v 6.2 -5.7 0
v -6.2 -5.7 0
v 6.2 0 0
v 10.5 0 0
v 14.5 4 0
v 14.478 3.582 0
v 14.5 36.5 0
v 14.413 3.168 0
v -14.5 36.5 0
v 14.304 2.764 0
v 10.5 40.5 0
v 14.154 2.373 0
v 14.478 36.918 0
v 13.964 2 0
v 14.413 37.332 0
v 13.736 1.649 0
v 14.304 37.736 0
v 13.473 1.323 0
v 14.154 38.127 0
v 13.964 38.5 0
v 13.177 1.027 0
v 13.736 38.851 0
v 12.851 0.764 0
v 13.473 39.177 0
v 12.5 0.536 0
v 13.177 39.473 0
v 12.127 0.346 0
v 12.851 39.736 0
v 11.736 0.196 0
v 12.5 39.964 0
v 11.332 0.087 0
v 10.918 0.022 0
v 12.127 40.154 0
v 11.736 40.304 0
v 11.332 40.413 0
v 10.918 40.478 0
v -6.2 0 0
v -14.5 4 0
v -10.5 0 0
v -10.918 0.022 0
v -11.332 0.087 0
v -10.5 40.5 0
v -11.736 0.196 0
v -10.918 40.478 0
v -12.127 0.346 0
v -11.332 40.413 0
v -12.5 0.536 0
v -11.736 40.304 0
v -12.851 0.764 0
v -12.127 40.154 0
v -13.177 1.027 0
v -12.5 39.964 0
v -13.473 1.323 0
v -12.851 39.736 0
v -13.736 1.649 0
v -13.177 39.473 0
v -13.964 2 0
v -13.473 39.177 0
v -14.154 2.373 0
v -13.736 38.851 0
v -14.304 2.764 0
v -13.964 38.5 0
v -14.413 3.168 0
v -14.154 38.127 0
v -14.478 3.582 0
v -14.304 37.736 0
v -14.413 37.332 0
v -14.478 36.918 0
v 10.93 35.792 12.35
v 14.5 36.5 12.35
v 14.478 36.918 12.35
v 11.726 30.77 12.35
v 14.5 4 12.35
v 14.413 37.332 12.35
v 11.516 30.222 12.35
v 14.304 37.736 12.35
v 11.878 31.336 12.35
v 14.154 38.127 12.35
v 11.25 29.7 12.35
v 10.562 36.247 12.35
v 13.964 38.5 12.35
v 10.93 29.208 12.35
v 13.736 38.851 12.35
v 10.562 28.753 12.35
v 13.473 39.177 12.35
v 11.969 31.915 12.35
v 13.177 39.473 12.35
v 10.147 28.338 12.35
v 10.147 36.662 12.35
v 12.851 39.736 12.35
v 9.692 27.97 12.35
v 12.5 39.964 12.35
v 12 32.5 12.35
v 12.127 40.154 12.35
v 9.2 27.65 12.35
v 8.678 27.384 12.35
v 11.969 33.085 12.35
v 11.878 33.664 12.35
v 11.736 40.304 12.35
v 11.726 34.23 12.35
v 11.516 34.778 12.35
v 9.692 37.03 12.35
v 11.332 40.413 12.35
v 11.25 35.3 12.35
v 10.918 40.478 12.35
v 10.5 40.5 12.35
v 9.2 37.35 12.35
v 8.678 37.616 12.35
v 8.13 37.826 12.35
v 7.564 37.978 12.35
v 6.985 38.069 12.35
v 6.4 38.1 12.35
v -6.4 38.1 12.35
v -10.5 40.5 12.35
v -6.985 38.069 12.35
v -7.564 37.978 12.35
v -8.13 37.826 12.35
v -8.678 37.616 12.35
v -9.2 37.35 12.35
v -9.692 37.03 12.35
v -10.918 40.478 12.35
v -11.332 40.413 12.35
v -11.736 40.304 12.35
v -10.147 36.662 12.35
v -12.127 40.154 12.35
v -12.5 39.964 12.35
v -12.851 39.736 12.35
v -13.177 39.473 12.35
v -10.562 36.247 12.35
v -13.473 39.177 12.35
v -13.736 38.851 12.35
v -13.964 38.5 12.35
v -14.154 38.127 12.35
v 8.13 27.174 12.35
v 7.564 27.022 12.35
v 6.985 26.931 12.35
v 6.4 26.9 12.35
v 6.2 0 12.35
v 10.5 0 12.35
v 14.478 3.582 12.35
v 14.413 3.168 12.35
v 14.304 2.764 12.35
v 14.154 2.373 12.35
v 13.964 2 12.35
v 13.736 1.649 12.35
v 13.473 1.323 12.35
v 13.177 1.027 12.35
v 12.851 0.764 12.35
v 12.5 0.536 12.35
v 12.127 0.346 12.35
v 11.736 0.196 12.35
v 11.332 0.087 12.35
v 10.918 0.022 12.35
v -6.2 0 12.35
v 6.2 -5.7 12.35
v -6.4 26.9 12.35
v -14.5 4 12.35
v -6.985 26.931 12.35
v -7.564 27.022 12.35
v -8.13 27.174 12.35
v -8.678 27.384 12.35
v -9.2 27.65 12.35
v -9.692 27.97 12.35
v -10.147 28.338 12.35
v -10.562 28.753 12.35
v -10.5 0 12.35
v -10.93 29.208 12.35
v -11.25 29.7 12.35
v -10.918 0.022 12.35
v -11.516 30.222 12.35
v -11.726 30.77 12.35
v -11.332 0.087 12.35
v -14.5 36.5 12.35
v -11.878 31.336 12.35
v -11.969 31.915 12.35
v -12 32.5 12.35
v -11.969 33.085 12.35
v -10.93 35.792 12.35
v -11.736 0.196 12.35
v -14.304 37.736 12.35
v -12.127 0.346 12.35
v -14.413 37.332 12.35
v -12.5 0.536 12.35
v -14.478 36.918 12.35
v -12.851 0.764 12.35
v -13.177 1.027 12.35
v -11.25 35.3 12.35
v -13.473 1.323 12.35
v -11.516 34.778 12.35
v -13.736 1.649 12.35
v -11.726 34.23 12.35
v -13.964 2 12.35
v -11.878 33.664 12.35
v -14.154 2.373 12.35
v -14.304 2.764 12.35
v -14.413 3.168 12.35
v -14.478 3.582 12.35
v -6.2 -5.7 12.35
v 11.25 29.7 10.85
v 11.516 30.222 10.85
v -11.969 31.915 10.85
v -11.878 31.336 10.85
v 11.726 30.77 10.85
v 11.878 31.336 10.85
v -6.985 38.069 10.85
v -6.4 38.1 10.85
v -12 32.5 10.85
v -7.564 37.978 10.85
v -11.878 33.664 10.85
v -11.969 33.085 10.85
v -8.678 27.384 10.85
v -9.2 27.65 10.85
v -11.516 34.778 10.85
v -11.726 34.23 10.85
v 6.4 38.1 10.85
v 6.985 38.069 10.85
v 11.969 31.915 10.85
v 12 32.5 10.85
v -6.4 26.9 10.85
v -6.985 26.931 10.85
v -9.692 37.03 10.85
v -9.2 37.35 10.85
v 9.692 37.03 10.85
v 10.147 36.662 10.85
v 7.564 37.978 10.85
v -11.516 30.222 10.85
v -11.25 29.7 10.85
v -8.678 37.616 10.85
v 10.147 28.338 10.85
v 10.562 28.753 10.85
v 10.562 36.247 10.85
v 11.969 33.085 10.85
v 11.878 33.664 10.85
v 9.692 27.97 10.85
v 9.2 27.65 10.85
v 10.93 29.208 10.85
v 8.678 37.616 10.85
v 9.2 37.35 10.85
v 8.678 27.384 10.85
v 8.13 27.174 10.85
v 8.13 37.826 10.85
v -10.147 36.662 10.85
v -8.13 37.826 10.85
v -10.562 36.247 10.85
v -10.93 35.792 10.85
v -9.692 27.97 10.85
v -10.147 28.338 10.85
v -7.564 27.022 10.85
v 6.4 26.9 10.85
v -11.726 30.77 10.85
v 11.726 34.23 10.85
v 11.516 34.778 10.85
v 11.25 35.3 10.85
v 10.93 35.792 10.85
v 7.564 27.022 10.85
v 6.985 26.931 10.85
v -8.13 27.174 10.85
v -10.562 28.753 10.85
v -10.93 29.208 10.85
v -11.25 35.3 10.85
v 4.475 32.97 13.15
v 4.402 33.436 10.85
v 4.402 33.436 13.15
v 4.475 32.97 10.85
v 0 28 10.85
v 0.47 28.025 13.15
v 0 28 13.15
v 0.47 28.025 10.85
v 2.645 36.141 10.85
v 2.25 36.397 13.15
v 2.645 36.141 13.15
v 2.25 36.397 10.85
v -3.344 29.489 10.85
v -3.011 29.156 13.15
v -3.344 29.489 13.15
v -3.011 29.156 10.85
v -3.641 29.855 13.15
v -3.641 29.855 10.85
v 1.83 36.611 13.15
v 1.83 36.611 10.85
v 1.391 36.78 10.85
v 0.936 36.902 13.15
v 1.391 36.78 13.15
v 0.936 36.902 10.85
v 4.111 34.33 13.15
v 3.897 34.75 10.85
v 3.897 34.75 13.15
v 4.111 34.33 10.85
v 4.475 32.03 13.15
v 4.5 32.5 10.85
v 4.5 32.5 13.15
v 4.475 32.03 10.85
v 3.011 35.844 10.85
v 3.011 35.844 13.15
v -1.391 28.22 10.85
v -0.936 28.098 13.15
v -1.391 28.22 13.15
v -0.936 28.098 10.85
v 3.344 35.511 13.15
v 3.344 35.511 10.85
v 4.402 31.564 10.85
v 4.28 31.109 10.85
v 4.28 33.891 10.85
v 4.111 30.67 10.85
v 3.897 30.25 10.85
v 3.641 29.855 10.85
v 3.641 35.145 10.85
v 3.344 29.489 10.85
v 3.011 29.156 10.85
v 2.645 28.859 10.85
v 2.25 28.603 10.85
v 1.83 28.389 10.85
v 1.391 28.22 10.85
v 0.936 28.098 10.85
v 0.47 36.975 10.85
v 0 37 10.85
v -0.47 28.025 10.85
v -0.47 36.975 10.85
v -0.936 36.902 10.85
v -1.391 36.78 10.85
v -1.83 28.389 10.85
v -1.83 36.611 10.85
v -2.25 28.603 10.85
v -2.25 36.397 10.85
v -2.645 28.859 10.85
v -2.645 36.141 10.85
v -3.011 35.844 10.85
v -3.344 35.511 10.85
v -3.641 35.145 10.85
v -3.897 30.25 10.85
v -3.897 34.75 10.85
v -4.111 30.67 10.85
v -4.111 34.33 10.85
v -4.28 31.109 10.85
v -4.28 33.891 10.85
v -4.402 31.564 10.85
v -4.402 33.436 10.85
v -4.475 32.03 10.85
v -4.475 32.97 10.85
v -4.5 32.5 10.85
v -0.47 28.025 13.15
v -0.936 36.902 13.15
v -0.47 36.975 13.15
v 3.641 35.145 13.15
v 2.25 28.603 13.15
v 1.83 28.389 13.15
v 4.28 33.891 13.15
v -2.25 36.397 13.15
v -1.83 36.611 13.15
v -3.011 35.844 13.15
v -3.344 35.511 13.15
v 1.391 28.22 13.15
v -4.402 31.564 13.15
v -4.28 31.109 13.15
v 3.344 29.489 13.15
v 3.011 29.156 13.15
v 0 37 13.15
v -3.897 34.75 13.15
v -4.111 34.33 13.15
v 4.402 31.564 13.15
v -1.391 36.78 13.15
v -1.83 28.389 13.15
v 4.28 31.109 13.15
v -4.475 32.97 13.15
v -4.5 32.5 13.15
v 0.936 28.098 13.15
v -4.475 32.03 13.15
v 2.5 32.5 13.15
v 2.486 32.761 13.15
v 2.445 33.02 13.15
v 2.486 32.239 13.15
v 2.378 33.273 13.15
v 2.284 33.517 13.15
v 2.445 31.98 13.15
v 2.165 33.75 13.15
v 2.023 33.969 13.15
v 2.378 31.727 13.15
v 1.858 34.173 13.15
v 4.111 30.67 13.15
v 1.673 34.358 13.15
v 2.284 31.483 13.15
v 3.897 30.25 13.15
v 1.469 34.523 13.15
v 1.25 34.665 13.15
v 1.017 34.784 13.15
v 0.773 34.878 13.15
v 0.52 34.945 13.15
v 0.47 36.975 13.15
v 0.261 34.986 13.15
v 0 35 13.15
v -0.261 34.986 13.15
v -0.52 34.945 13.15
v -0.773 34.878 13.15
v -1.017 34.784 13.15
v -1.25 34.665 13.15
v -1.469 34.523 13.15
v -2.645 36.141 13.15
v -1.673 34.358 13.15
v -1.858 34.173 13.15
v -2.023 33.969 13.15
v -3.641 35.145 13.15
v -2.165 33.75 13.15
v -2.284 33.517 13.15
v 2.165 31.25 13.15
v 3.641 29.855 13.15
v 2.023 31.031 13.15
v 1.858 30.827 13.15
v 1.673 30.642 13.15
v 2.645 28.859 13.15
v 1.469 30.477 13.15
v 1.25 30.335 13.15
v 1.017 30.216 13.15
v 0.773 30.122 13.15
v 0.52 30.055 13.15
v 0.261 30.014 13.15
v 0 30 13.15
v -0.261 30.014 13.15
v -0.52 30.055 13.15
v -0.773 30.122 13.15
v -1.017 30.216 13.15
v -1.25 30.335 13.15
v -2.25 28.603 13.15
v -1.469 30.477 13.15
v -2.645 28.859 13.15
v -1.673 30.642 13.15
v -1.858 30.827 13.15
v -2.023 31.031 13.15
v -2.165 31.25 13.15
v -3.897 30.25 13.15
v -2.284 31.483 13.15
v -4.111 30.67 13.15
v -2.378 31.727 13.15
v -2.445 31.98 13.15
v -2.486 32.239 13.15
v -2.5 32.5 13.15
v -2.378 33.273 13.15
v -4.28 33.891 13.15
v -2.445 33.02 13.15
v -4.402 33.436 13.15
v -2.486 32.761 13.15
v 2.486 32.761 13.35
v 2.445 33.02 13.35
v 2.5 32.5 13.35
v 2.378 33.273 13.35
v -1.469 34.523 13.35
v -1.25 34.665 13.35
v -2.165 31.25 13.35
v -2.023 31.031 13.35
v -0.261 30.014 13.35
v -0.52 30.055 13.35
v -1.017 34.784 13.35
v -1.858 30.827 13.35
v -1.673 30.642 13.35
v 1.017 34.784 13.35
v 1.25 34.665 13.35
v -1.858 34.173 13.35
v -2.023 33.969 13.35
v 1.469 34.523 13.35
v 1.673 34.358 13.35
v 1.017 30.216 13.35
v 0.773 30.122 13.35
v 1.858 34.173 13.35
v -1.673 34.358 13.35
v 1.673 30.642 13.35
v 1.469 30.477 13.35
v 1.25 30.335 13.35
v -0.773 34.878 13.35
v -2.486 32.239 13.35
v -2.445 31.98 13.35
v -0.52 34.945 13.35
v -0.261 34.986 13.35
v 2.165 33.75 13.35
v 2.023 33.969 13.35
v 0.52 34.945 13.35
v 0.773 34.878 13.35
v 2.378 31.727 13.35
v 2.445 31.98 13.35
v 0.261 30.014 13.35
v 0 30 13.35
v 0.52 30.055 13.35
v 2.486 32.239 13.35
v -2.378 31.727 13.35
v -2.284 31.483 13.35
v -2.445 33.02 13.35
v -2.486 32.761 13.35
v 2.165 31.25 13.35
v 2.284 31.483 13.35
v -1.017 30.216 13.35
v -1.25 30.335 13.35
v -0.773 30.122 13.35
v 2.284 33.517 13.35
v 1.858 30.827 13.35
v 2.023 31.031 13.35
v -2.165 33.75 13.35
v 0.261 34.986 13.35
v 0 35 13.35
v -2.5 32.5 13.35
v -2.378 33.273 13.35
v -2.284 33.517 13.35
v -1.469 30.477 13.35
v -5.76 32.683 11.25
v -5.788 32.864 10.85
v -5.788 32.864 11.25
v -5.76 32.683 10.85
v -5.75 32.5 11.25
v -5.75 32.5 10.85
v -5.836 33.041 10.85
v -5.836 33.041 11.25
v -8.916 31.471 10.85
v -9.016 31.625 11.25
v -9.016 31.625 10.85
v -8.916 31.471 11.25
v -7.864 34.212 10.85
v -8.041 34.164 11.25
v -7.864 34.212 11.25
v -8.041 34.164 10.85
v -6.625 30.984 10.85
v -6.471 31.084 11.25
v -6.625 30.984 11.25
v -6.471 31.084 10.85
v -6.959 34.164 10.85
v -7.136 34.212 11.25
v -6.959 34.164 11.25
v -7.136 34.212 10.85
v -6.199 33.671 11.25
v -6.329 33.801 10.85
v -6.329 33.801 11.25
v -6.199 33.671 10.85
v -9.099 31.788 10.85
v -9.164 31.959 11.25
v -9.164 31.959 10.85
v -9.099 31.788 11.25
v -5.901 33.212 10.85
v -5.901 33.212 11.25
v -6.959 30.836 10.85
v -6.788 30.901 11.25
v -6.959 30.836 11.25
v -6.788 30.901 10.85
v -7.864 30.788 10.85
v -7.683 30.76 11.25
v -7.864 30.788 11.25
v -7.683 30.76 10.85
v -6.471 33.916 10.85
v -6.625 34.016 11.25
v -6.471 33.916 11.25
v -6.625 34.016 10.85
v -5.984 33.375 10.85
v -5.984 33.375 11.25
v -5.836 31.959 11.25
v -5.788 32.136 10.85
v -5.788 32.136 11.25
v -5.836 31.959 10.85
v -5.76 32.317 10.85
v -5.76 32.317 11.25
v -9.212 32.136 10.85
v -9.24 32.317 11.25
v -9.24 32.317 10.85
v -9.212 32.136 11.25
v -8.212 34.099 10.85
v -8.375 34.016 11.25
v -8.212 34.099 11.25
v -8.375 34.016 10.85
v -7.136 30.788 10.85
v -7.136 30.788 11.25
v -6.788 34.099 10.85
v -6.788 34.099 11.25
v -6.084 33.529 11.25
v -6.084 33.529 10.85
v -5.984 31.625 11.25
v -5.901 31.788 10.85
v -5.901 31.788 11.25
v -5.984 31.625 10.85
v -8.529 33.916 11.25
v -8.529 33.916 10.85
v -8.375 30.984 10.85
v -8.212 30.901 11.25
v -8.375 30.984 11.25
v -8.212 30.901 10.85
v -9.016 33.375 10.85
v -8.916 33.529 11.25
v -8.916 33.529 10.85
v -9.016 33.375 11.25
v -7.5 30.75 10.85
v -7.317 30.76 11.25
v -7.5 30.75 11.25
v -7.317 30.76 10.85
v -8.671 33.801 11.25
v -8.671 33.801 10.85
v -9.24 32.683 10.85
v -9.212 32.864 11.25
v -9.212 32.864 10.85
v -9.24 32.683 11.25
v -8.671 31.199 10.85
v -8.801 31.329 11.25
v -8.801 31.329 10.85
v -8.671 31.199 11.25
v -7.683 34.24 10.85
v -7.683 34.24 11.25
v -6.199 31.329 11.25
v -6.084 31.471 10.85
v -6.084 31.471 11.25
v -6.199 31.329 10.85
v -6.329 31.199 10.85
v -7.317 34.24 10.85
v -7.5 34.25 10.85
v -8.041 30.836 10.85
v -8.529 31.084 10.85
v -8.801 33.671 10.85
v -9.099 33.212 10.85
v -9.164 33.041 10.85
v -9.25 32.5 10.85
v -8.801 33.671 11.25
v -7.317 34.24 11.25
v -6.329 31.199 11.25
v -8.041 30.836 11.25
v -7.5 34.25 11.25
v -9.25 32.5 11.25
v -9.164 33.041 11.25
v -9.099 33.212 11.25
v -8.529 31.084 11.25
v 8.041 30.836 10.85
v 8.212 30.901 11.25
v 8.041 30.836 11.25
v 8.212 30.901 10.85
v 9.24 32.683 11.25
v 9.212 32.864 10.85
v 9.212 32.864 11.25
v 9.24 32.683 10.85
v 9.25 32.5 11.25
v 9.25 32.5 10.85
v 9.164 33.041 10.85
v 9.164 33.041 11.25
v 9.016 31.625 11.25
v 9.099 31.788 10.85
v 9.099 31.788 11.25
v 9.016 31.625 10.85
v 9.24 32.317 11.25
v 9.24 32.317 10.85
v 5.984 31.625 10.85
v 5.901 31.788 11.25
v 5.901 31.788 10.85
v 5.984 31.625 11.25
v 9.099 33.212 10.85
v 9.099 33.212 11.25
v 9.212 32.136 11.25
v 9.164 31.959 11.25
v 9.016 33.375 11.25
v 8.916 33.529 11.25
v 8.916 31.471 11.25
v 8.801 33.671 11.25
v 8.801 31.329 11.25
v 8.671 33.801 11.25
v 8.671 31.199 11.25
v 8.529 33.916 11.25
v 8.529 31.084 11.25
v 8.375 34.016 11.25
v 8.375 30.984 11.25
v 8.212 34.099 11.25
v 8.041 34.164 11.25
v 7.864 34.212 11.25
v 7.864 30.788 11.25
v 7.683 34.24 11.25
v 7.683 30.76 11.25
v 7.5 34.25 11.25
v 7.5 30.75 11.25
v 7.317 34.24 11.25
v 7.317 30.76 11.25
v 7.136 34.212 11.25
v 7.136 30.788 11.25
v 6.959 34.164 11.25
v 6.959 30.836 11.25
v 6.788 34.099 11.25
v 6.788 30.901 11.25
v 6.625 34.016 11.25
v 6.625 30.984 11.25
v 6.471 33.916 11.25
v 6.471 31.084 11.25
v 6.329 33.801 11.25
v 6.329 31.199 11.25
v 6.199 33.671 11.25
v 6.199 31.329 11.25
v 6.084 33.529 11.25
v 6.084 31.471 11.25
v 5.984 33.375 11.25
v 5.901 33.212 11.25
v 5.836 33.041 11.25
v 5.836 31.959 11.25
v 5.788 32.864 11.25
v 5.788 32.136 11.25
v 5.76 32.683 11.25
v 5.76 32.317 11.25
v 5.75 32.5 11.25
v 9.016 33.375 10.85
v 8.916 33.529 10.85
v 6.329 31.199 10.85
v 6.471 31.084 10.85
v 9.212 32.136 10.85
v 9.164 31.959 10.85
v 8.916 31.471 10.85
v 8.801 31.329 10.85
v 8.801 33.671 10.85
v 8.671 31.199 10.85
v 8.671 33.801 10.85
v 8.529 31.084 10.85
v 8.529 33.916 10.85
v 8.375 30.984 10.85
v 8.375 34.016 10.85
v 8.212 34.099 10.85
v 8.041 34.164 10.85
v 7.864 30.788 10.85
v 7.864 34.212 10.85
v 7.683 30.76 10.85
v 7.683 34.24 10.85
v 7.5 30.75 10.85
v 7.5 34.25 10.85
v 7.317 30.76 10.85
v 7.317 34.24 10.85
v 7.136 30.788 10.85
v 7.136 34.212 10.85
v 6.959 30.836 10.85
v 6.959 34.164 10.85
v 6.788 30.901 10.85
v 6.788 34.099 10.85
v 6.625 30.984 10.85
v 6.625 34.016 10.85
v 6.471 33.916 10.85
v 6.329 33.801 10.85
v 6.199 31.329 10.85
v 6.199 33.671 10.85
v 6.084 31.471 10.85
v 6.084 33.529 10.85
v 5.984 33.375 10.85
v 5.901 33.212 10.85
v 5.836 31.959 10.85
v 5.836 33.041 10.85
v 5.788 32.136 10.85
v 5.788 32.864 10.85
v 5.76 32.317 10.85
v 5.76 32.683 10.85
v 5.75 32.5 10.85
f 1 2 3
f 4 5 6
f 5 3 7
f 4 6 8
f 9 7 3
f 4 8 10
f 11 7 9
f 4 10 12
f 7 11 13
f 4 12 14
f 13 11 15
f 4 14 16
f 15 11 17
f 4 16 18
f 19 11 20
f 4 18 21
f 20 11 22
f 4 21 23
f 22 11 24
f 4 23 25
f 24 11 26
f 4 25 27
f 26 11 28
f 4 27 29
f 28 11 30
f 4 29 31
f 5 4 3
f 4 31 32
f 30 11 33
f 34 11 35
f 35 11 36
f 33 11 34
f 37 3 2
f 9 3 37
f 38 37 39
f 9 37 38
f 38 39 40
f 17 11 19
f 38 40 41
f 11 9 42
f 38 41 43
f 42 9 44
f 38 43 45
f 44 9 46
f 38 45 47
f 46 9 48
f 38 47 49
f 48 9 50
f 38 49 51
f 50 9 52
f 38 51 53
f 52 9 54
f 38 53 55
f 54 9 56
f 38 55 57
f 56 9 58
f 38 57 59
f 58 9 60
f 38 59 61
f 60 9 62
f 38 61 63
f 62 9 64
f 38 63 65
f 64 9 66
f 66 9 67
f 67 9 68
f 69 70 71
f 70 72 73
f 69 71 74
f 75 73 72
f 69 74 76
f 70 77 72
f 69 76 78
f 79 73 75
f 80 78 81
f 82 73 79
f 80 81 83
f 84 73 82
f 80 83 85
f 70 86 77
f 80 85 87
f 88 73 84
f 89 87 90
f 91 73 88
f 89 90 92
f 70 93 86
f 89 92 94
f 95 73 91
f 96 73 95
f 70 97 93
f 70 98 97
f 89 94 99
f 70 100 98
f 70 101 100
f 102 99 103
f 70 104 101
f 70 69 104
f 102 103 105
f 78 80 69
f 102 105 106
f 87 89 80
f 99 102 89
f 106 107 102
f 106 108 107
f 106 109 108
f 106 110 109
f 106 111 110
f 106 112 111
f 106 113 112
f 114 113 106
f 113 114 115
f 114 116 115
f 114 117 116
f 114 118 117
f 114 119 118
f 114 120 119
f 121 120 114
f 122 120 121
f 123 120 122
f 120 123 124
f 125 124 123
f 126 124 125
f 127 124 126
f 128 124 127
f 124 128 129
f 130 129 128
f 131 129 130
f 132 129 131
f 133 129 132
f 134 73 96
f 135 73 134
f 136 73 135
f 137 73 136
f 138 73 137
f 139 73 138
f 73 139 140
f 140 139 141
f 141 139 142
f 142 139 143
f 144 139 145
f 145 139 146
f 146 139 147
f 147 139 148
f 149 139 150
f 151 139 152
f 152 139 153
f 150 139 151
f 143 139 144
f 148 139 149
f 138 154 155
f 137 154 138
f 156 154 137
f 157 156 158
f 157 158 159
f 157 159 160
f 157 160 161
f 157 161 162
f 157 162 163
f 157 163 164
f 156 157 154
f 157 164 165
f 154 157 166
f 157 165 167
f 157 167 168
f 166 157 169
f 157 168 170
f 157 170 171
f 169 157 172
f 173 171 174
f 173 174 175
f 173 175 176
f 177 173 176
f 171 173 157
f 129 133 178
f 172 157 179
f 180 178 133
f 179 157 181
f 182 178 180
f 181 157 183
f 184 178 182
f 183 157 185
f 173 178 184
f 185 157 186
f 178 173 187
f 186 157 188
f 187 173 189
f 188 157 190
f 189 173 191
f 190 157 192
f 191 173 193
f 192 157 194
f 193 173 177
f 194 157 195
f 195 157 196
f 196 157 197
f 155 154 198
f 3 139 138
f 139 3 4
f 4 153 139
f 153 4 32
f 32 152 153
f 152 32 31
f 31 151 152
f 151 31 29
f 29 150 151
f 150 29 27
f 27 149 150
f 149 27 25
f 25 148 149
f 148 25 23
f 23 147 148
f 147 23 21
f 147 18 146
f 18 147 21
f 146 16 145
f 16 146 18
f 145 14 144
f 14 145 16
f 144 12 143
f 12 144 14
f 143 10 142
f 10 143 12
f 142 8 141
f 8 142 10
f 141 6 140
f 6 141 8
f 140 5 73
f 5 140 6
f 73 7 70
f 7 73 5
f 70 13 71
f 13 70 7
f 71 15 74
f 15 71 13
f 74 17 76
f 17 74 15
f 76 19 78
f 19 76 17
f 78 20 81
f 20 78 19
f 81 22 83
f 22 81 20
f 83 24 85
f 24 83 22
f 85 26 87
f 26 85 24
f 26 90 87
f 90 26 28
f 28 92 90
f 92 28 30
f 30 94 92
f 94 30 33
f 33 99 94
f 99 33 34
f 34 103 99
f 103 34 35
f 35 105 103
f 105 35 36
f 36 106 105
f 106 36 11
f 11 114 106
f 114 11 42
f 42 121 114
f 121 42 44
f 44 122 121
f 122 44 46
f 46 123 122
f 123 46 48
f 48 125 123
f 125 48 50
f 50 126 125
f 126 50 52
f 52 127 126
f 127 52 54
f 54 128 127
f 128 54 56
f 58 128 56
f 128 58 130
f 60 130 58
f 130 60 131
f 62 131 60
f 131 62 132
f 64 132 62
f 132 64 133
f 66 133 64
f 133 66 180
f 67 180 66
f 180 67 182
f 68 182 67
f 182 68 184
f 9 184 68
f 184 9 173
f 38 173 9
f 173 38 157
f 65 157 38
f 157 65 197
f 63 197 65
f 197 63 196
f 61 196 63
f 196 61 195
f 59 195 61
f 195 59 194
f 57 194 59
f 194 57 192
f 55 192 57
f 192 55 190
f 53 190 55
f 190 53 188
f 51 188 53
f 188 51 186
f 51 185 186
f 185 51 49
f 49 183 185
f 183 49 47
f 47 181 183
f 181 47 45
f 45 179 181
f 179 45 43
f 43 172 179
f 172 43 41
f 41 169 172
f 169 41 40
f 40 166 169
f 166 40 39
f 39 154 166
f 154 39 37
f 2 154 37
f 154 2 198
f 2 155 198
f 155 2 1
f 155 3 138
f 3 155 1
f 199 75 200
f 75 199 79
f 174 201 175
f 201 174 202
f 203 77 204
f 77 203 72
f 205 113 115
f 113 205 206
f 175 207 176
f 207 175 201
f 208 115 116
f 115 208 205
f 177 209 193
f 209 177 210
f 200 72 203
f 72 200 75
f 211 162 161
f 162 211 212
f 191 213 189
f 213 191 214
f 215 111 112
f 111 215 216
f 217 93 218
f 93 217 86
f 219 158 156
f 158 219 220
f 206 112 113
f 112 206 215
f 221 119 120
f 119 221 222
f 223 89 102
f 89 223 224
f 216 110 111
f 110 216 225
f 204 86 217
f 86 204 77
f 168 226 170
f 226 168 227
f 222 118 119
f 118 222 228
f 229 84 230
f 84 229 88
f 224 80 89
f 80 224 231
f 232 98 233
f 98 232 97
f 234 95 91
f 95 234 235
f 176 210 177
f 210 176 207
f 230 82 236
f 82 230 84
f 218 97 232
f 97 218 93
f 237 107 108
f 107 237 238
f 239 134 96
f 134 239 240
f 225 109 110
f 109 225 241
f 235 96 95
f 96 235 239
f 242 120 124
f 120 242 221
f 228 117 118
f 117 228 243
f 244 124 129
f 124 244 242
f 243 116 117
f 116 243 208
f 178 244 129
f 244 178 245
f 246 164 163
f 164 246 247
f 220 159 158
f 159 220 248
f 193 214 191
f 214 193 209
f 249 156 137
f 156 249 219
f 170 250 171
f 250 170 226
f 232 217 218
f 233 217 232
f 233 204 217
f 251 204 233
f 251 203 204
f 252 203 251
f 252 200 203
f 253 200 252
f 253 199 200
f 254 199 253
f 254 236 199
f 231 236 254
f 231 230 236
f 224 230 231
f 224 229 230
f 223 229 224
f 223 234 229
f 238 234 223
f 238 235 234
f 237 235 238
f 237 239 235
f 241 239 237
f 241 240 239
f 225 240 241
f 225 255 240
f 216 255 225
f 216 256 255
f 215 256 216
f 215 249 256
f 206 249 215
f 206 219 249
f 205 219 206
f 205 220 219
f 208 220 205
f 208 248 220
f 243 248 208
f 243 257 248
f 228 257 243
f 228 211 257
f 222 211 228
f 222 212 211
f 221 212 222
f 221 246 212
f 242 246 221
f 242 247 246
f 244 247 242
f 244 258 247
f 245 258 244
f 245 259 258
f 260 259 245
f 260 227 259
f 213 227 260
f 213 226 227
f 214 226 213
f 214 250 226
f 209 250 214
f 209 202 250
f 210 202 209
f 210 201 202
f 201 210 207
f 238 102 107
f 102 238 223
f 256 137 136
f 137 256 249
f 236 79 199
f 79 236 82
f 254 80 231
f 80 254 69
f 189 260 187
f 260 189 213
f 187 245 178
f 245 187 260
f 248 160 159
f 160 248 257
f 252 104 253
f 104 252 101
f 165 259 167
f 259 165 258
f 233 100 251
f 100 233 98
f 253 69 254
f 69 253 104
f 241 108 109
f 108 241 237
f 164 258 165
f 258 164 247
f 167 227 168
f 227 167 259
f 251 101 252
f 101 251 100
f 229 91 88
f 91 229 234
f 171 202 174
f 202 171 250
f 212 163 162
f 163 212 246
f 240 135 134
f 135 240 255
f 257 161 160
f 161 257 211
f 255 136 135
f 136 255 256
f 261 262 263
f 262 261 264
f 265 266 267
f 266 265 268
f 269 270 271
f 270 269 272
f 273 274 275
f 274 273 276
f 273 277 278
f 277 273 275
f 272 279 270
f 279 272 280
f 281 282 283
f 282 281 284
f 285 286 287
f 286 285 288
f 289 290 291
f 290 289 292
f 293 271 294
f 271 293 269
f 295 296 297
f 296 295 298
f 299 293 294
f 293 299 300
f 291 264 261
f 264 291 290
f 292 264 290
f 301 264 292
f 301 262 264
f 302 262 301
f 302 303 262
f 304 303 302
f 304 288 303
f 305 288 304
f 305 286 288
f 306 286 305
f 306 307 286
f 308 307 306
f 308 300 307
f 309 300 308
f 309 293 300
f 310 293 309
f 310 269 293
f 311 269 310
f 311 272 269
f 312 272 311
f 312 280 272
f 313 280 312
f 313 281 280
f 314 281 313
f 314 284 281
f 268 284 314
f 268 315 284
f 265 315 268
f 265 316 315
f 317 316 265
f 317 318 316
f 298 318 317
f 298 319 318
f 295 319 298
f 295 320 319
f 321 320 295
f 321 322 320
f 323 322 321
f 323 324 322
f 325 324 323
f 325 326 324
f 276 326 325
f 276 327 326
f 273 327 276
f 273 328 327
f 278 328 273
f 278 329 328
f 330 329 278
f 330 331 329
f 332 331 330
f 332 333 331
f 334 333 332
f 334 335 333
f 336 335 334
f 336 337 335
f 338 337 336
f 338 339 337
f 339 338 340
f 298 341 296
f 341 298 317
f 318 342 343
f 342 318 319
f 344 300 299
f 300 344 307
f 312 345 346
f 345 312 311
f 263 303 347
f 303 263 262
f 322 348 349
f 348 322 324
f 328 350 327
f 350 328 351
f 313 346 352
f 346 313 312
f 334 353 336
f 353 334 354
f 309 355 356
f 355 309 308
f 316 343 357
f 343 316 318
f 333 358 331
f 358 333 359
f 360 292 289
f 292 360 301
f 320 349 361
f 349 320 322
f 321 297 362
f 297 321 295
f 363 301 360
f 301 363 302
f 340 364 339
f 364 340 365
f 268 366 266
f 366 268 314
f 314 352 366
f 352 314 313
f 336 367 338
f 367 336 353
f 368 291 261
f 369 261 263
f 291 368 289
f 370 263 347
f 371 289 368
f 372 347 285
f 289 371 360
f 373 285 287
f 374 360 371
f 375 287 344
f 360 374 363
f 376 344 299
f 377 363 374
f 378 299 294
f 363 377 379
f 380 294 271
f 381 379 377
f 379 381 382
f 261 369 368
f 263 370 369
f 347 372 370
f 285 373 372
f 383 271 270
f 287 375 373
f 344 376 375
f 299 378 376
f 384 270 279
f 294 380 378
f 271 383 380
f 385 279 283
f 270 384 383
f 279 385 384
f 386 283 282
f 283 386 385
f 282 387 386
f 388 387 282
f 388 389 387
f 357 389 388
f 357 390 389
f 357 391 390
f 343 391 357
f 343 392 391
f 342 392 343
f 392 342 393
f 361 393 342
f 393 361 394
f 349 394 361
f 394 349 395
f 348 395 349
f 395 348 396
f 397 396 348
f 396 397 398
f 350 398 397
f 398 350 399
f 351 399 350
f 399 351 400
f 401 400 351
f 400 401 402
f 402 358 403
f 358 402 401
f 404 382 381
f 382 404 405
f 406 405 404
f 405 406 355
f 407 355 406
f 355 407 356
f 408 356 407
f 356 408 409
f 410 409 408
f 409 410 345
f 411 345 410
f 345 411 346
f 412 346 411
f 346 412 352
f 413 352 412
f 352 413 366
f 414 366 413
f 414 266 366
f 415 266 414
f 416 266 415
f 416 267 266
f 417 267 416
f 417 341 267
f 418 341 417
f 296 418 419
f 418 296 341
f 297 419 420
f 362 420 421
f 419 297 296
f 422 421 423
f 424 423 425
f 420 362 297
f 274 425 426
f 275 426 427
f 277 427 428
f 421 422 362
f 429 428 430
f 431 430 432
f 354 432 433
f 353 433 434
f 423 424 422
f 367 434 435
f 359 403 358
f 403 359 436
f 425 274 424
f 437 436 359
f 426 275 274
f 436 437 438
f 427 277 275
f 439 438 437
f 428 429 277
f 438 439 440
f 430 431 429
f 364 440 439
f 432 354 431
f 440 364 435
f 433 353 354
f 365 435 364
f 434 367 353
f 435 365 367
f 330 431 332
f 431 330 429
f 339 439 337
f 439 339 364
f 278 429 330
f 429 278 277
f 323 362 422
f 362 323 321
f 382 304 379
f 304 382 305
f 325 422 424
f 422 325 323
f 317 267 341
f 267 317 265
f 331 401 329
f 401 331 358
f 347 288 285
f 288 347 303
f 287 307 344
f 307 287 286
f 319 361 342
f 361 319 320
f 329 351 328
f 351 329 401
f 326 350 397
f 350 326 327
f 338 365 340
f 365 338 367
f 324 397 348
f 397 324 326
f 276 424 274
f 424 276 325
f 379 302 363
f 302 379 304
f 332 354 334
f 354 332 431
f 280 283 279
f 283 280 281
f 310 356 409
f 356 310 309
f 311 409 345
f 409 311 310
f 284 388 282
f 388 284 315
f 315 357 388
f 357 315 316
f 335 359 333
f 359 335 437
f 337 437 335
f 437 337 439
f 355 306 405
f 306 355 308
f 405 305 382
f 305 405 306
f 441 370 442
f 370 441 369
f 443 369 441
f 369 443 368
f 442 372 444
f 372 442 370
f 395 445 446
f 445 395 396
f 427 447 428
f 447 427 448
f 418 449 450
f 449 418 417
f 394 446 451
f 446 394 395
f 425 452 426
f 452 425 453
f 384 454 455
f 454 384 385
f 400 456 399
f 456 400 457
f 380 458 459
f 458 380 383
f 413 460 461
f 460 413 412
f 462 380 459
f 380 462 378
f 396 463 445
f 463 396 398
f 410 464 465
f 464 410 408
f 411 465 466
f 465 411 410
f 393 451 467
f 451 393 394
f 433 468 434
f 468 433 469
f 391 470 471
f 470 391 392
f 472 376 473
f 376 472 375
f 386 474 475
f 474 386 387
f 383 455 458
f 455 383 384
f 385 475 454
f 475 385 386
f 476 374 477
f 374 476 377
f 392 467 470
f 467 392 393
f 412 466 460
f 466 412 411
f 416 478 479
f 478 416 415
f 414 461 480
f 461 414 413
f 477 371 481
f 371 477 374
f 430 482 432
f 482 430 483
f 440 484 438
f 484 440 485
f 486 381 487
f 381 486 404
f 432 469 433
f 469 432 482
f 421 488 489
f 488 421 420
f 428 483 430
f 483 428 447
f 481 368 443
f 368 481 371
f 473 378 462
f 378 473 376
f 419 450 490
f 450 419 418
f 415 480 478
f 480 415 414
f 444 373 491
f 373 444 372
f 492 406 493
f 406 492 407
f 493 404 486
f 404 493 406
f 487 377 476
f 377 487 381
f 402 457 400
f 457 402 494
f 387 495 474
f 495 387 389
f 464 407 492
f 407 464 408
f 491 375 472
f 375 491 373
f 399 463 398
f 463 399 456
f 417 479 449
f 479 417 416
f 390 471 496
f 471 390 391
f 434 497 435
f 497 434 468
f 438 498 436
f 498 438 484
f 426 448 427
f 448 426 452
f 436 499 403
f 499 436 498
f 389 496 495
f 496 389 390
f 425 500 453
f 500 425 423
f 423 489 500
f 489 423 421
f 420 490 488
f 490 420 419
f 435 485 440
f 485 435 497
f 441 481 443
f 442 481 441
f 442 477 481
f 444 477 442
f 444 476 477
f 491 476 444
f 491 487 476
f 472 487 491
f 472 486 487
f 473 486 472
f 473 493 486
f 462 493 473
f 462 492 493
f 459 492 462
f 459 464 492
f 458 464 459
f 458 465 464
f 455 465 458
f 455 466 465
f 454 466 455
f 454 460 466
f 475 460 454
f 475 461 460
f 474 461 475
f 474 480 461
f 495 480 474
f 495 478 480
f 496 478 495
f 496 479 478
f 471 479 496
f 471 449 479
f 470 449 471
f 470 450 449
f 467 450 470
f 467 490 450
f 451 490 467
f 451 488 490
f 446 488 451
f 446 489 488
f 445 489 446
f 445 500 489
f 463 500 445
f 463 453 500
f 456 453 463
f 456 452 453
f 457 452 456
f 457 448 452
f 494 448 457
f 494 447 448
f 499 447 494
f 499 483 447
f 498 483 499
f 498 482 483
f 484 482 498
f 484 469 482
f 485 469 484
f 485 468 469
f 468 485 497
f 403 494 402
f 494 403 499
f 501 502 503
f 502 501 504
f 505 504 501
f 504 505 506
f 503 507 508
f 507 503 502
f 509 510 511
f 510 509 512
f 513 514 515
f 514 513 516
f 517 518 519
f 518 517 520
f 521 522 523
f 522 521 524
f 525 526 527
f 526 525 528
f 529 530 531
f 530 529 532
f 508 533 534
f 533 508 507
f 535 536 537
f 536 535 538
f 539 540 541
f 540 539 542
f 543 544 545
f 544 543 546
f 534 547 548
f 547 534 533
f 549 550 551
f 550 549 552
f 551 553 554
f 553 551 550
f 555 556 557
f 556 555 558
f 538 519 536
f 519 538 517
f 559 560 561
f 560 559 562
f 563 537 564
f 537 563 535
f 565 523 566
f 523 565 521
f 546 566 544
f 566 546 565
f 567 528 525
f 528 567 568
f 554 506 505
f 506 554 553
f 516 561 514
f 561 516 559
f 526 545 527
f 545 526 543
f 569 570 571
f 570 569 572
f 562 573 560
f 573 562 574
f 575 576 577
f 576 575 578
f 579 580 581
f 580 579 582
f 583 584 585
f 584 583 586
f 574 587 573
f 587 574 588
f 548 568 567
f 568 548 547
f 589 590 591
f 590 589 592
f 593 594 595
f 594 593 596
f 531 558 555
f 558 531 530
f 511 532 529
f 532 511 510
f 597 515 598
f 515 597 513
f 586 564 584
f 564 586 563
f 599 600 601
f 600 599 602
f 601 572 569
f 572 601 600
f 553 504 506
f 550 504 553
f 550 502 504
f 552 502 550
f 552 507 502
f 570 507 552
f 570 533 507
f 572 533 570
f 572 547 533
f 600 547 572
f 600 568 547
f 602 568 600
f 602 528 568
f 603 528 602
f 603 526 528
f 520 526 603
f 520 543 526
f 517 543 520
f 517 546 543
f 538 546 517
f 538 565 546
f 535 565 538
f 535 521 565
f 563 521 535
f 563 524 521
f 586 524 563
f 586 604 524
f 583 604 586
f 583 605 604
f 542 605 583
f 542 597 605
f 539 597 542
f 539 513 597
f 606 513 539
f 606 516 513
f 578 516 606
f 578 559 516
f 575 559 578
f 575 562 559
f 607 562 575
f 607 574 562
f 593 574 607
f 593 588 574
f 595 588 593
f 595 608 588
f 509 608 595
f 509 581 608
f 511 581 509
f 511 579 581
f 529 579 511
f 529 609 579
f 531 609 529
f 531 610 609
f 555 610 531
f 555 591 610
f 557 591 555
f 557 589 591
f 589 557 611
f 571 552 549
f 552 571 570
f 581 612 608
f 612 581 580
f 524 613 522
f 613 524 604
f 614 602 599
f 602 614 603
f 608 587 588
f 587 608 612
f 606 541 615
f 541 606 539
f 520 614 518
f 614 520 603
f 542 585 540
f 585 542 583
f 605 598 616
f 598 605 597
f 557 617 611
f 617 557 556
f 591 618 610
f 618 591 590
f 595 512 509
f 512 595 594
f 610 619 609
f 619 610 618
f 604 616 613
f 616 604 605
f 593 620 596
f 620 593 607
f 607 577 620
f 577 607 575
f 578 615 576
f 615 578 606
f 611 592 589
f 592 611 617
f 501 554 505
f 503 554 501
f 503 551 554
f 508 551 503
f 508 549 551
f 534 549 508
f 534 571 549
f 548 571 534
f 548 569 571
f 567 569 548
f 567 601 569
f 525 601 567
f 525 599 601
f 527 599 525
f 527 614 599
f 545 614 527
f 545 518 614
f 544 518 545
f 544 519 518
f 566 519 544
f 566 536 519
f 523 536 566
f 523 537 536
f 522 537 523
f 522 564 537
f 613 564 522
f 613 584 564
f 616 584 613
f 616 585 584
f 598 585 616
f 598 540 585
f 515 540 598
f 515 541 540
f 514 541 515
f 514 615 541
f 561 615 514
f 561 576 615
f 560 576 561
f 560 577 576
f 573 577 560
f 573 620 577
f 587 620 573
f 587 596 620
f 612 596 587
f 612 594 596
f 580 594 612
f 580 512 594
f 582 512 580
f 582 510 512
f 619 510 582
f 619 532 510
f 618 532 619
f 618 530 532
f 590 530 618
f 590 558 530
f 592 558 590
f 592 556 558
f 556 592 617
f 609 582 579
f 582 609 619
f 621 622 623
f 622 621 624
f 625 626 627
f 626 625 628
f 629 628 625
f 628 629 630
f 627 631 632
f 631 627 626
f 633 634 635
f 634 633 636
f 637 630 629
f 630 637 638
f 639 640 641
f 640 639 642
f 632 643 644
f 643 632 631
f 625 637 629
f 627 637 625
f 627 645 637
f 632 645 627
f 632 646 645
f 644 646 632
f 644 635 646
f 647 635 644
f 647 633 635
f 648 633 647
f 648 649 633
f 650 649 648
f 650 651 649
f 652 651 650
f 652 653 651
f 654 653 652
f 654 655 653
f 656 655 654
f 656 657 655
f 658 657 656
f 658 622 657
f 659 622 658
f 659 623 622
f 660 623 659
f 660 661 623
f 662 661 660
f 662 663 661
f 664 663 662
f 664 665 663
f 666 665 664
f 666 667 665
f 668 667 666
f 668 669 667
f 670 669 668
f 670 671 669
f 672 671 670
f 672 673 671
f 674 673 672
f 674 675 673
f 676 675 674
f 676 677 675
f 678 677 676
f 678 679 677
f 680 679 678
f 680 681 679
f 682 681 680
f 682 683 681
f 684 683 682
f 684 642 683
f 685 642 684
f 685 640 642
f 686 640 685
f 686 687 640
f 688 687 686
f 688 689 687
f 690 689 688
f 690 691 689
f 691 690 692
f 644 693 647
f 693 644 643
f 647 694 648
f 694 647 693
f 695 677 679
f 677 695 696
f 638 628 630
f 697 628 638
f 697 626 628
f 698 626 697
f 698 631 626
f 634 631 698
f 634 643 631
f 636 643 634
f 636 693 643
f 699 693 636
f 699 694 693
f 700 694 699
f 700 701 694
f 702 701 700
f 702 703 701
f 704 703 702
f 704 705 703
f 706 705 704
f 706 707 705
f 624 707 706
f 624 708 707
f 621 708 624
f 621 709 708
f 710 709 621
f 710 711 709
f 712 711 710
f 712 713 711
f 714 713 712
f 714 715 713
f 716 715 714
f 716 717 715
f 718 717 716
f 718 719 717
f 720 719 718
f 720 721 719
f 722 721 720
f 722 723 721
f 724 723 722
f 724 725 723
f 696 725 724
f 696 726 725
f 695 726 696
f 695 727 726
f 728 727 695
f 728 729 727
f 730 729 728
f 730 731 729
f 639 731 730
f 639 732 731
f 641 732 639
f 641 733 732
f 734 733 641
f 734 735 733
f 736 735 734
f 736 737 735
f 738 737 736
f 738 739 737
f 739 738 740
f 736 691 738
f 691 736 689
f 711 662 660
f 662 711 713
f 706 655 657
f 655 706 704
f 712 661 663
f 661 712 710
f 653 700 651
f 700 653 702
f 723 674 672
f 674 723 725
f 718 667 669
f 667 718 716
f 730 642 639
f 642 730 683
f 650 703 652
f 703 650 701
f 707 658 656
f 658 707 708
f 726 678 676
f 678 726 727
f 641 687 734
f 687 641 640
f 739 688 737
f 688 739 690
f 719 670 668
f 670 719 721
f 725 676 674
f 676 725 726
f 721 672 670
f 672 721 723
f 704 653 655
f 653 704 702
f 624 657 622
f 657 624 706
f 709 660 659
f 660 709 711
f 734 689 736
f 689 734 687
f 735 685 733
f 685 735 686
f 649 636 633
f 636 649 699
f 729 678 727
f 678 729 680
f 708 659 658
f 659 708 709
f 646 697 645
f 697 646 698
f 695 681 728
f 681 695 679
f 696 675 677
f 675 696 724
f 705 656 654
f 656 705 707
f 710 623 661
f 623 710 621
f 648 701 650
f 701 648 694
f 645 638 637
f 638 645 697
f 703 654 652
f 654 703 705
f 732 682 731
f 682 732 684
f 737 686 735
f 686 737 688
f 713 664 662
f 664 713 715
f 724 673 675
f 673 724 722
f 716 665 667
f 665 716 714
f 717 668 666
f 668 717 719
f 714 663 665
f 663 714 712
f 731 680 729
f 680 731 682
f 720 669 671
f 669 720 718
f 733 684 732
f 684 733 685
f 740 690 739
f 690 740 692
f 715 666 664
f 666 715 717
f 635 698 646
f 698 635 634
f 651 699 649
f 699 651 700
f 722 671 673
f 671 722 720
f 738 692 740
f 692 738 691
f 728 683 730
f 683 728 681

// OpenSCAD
// =================================================================
// OpenSCAD Modell: Kameramodul Gehäuse
// Basierend auf den korrigierten technischen Zeichnungen und Herstellerangaben
// =================================================================

$fn = 60; // Erhöht die Segmentanzahl für perfekt runde Kreise und Zylinder

// --- PARAMETER (Alle Maße in mm) ---

// Hauptabmessungen laut Hersteller & Skizzenabgleich
gesamt_breite      = 29.0;  // Herstellerangabe
gehaeuse_hoehe     = 40.5;  // Eigene Messung des Hauptkörpers
stufe_hoehe        = 5.7;   // Berechnet aus Herstellertotal (46.2mm) - Hauptkörper (40.5mm)
stufe_breite       = 12.4;  // Breite des unteren Kabelhalses
gehaeuse_dicke     = 12.35; // Gehäusedicke ohne Linse
gesamt_dicke       = 13.15; // Gesamtdicke inklusive Linse
linsen_ueberstand  = gesamt_dicke - gehaeuse_dicke; // 0.8 mm Überstand über Gehäusefront

// Positionierung der optischen Achse (Letzte Korrekturauflage)
linsen_y_von_oben  = 8.0;   // Abstand von Gehäuseoberkante bis Linsenmitte
linsen_y_pos       = gehaeuse_hoehe - linsen_y_von_oben; // Absolute Y-Position im Koordinatensystem

// Abmessungen der Aussparung (Kapselform / Frontglas)
recess_breite      = 24.0;  // Gesamte horizontale Ausdehnung der Aussparung
recess_hoehe       = 11.2;  // Vertikale Höhe der Aussparung
recess_tiefe       = 1.5;   // *HINWEIS: Angenommener Wert, da Tiefe nicht explizit bemaßt*

// Details der Kamera-Optik & LEDs
kamera_dm_aussen   = 9.0;   // Äußerer Ring der Kameralinse
kamera_dm_innen    = 5.0;   // Innerer Linsendurchmesser
led_abstand_x      = 7.5;   // Pitch von Gehäusemitte zu den LED-Mittelpunkten (links/rechts je 7.5mm)
led_durchmesser    = 3.5;   // *HINWEIS: Sinnvoller Richtwert für LEDs, da Durchmesser nicht explizit bemaßt*

// Geometrie-Optionen
eckradius_gehaeuse = 4.0;   // Rundung der vier Hauptgehäuseecken


// --- GEOMTRIE-MODULE ---

module gehaeuse_2d_profil() {
    // Hauptkörper des Gehäuses (wird im Ursprung auf Y=0 aufgesetzt)
    translate([-gesamt_breite/2 + eckradius_gehaeuse, eckradius_gehaeuse])
        minkowski() {
            square([gesamt_breite - 2*eckradius_gehaeuse, gehaeuse_hoehe - 2*eckradius_gehaeuse]);
            circle(r=eckradius_gehaeuse);
        }
    
    // Untere Stufe (Kabelhals)
    translate([-stufe_breite/2, -stufe_hoehe])
        square([stufe_breite, stufe_hoehe + 0.1]); // 0.1mm Überlappung verhindert Non-Manifold-Fehler
}

module linsen_aussparung_2d() {
    // Berechnet den Abstand der beiden Kreiselemente für die Kapselform
    recess_zentrum_abstand = (recess_breite - recess_hoehe) / 2;
    translate([0, linsen_y_pos]) {
        hull() {
            translate([-recess_zentrum_abstand, 0]) circle(d=recess_hoehe);
            translate([recess_zentrum_abstand, 0]) circle(d=recess_hoehe);
        }
    }
}


// --- 3D-AUFBAU (CSG-Operationen) ---

difference() {
    // 1. Hauptextrusion des Gehäusekörpers
    linear_extrude(height = gehaeuse_dicke) {
        gehaeuse_2d_profil();
    }
    
    // 2. Abzug der vorderen Kapsel-Aussparung für die Glasfront
    translate([0, 0, gehaeuse_dicke - recess_tiefe])
        linear_extrude(height = recess_tiefe + 0.1)
            linsen_aussparung_2d();
}

// 3. Aufbau der hervorstehenden Kameralinse
translate([0, linsen_y_pos, gehaeuse_dicke - recess_tiefe]) {
    // Äußerer Linsenzylinder
    cylinder(d = kamera_dm_aussen, h = recess_tiefe + linsen_ueberstand);
    
    // Innere optische Linse (wird minimal höher gesetzt zur visuellen Trennung)
    translate([0, 0, recess_tiefe + linsen_ueberstand])
        cylinder(d = kamera_dm_innen, h = 0.2);
}

// 4. Andeutung der LEDs innerhalb der Aussparung
translate([0, linsen_y_pos, gehaeuse_dicke - recess_tiefe]) {
    // Linke LED
    translate([-led_abstand_x, 0, 0])
        cylinder(d = led_durchmesser, h = 0.4);
    
    // Rechte LED
    translate([led_abstand_x, 0, 0])
        cylinder(d = led_durchmesser, h = 0.4);
}
